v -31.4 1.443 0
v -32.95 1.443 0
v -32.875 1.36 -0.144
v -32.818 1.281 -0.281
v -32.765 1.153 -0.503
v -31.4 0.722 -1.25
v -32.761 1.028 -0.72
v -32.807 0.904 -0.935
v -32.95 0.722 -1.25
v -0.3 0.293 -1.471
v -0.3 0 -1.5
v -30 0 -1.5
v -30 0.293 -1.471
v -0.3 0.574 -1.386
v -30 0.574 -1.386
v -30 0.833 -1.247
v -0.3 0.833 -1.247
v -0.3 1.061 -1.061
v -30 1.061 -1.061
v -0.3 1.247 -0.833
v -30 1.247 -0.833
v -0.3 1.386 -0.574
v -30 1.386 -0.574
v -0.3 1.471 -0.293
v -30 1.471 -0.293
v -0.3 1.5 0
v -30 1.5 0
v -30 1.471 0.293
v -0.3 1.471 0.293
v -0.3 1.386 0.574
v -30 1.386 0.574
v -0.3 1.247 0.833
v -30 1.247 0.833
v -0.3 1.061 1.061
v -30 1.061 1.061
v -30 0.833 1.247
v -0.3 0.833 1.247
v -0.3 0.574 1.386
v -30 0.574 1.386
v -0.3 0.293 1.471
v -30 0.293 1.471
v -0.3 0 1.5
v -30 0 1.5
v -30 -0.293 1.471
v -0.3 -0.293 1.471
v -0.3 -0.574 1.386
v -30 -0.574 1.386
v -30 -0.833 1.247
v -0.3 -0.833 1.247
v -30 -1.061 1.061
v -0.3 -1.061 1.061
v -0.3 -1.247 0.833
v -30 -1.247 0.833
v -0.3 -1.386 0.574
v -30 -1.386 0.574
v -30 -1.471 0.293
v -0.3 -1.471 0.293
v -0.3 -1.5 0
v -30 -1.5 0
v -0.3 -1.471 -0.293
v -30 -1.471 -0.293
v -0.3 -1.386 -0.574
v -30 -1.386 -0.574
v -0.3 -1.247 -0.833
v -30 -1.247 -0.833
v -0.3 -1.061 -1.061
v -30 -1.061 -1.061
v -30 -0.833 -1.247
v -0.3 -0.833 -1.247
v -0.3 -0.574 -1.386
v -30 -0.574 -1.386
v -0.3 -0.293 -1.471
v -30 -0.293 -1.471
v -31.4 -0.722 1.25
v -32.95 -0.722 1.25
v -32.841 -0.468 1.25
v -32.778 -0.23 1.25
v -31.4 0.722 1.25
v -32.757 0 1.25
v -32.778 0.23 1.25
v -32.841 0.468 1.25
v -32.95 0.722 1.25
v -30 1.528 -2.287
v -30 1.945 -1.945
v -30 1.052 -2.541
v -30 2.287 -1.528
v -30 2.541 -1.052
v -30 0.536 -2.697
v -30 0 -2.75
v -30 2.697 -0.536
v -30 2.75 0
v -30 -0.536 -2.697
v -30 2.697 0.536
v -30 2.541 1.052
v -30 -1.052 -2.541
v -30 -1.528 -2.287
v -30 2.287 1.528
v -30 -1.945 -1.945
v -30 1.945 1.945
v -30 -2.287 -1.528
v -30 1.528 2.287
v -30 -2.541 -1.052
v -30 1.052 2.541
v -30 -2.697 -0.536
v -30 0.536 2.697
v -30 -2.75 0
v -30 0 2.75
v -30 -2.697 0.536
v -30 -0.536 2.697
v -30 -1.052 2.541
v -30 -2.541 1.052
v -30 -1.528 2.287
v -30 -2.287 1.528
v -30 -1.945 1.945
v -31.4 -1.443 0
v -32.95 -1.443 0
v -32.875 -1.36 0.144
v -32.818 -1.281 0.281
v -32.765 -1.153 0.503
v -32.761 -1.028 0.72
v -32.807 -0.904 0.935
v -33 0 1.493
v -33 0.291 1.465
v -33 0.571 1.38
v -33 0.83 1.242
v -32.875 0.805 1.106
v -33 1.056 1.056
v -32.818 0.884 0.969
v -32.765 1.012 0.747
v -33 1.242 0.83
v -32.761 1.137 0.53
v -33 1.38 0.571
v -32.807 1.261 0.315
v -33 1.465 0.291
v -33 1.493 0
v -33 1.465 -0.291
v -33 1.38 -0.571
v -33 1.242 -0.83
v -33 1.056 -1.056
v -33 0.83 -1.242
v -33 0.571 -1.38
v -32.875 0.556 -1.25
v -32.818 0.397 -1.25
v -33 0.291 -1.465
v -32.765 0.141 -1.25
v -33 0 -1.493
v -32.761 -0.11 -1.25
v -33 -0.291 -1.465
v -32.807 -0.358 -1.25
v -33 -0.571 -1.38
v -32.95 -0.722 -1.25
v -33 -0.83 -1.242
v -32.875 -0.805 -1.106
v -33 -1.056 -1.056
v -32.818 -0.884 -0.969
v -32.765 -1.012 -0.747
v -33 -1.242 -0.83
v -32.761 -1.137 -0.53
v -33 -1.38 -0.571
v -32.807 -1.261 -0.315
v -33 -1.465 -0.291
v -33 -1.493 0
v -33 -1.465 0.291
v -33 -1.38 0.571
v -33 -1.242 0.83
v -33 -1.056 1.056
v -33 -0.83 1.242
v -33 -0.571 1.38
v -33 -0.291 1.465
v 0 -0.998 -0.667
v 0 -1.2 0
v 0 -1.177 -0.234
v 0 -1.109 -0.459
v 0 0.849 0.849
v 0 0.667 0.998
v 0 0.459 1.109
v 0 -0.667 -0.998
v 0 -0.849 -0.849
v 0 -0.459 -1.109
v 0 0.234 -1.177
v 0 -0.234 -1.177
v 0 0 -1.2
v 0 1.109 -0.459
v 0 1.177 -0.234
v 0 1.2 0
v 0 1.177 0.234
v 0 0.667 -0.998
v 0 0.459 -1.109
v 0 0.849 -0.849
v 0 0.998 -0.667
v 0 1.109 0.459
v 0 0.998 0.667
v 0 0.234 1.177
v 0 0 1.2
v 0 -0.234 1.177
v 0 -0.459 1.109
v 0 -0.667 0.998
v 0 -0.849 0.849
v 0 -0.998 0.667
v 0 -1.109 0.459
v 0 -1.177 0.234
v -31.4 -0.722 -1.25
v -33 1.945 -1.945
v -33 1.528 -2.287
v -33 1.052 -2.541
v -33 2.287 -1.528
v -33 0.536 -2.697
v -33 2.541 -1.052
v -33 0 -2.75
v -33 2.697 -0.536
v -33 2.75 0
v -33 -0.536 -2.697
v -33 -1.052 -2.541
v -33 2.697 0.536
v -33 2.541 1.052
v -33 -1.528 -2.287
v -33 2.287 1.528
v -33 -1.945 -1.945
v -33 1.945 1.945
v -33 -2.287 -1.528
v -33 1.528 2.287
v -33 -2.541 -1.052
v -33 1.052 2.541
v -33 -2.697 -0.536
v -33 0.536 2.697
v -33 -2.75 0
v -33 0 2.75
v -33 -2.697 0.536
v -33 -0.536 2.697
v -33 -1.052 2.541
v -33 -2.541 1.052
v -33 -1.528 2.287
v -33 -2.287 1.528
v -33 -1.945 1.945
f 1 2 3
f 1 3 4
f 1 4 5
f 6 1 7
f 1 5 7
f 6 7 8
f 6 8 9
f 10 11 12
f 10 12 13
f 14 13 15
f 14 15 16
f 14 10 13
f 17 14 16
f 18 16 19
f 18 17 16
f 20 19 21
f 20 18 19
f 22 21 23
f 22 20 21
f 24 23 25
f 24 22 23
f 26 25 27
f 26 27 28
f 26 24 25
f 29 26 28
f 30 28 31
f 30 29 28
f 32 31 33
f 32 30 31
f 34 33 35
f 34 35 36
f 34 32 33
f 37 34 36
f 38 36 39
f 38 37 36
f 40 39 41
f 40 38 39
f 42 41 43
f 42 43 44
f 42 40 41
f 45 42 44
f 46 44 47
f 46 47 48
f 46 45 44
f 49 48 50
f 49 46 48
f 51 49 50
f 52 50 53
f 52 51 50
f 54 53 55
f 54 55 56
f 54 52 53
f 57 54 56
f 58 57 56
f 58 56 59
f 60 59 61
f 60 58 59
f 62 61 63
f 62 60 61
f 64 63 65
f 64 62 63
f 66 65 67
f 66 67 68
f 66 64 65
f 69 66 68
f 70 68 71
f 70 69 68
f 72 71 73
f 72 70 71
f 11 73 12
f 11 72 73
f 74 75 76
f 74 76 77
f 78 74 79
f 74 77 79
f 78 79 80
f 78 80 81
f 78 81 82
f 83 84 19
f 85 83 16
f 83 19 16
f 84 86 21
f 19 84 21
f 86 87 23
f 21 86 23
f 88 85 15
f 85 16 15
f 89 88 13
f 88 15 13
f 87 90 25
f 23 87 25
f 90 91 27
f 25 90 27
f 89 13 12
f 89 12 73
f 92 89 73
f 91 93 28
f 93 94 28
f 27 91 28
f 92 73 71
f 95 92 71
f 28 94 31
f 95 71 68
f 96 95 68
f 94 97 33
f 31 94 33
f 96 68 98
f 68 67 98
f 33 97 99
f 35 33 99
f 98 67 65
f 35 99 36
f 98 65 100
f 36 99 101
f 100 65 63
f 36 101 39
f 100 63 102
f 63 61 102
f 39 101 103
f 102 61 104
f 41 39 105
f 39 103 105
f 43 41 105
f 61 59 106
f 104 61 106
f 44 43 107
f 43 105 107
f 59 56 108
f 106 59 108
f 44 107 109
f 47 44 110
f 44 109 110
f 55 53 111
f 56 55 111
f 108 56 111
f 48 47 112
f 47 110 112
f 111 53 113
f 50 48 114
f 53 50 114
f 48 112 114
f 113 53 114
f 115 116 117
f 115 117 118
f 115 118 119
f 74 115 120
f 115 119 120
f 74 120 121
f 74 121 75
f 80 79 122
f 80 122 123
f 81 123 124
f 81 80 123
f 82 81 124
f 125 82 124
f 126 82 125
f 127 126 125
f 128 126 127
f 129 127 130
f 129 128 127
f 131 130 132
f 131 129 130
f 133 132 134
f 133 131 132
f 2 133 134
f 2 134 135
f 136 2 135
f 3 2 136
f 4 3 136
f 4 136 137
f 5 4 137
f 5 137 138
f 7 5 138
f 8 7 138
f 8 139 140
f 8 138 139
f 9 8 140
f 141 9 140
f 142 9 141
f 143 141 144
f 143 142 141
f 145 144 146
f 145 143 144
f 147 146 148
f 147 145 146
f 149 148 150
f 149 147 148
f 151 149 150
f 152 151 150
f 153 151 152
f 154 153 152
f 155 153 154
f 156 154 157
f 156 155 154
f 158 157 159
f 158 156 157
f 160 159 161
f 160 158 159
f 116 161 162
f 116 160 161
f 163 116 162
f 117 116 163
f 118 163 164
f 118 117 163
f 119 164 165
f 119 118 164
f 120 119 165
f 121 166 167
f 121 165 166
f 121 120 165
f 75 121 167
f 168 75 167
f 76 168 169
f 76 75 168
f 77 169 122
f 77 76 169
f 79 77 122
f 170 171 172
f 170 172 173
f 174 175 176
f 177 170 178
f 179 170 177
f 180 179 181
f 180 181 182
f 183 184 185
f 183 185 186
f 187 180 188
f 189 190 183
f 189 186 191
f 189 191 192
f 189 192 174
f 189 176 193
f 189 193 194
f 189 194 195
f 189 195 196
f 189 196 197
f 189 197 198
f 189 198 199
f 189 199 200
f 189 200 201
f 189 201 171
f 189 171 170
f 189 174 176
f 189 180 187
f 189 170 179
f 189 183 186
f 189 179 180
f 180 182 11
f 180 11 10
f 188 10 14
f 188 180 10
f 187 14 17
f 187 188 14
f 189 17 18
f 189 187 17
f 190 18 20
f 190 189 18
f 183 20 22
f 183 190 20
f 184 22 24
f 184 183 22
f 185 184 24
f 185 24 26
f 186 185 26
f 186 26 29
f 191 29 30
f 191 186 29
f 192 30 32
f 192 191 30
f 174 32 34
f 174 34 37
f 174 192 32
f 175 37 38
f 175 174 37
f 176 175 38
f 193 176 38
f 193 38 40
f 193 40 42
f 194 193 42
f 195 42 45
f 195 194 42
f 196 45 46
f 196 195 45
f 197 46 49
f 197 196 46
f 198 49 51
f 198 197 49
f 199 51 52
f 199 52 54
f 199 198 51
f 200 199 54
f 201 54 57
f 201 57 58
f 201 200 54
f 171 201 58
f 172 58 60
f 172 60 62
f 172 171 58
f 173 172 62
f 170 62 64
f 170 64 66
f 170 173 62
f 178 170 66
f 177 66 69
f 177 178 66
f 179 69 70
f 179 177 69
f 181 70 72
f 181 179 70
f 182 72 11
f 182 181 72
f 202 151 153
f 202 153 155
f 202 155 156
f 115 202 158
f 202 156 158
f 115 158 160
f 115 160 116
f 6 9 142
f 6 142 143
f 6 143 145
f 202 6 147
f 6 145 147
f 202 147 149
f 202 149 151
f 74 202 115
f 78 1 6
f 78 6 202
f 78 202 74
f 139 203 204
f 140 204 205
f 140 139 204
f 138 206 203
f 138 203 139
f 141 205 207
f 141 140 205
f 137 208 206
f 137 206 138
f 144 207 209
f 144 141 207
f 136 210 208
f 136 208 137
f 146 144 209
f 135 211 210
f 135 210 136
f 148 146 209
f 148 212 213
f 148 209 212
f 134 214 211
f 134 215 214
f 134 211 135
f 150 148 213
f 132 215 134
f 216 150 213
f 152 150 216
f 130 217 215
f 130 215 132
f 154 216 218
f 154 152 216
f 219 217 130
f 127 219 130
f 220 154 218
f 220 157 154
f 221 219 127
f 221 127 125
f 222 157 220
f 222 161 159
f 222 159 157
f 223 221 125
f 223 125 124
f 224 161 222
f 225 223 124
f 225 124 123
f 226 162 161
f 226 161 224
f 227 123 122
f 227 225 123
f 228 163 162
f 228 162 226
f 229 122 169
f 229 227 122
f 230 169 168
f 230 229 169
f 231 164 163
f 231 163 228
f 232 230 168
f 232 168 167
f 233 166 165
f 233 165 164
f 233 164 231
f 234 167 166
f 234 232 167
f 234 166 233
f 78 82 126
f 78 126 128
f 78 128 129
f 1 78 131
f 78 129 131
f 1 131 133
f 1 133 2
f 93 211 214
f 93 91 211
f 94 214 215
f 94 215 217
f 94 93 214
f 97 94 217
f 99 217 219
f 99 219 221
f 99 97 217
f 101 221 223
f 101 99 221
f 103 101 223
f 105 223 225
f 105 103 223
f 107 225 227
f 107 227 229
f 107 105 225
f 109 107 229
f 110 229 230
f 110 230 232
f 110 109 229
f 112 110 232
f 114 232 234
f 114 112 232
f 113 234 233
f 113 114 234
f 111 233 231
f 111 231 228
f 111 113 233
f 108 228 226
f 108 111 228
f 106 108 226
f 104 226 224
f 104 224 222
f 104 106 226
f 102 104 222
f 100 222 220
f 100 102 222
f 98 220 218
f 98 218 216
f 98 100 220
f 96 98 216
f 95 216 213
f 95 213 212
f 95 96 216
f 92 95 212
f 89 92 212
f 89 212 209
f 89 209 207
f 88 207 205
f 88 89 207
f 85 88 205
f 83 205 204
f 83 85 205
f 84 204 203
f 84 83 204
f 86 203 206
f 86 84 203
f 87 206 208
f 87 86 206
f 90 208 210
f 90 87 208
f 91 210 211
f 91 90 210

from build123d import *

# Parameters (mm, degrees)
SKETCH2_R           = 1.5
BOSS_EXTRUDE1_DEPTH = 30
CHAMFER1_SIZE       = 0.3
SKETCH6_W           = 3
SKETCH6_H           = 2.75
CUT_EXTRUDE1_DEPTH  = 1.6
SKETCH8_R           = 1.493375673
CUT_EXTRUDE2_DEPTH  = 1
CUT_EXTRUDE2_TAPER  = 45


with BuildPart() as part:
    # Sketch2 → Boss-Extrude1 (new body)
    with BuildSketch(Plane(origin=(0, 0, 0), x_dir=(0, 0, -1), z_dir=(1, 0, 0))):
        Circle(SKETCH2_R)
    extrude(amount=-BOSS_EXTRUDE1_DEPTH)

    # Chamfer1
    chamfer1_edges = [part.edges().sort_by_distance(p)[0] for p in [
        (0, 0, 1.5),
    ]]
    chamfer(chamfer1_edges, length=CHAMFER1_SIZE)

    # Sketch6 → Revolve1 (revolve)
    with BuildSketch(Plane.XY):
        with Locations((-31.5, 1.375)):
            Rectangle(SKETCH6_W, SKETCH6_H)
    revolve(axis=Axis((-30, 0, 0), (1, 0, 0)))

    # Sketch7 → Cut-Extrude1 (cut)
    with BuildSketch(Plane.ZY.offset(33)):
        Polygon((0, 1.443375673), (-1.25, 0.721687836), (-1.25, -0.721687836), (0, -1.443375673), (1.25, -0.721687836), (1.25, 0.721687836), align=None)
    extrude(amount=-CUT_EXTRUDE1_DEPTH, mode=Mode.SUBTRACT)

    # Sketch8 → Cut-Extrude2 (cut)
    with BuildSketch(Plane.ZY.offset(33)):
        Circle(SKETCH8_R)
    extrude(amount=-CUT_EXTRUDE2_DEPTH, taper=CUT_EXTRUDE2_TAPER, mode=Mode.SUBTRACT)


solid = part.part
